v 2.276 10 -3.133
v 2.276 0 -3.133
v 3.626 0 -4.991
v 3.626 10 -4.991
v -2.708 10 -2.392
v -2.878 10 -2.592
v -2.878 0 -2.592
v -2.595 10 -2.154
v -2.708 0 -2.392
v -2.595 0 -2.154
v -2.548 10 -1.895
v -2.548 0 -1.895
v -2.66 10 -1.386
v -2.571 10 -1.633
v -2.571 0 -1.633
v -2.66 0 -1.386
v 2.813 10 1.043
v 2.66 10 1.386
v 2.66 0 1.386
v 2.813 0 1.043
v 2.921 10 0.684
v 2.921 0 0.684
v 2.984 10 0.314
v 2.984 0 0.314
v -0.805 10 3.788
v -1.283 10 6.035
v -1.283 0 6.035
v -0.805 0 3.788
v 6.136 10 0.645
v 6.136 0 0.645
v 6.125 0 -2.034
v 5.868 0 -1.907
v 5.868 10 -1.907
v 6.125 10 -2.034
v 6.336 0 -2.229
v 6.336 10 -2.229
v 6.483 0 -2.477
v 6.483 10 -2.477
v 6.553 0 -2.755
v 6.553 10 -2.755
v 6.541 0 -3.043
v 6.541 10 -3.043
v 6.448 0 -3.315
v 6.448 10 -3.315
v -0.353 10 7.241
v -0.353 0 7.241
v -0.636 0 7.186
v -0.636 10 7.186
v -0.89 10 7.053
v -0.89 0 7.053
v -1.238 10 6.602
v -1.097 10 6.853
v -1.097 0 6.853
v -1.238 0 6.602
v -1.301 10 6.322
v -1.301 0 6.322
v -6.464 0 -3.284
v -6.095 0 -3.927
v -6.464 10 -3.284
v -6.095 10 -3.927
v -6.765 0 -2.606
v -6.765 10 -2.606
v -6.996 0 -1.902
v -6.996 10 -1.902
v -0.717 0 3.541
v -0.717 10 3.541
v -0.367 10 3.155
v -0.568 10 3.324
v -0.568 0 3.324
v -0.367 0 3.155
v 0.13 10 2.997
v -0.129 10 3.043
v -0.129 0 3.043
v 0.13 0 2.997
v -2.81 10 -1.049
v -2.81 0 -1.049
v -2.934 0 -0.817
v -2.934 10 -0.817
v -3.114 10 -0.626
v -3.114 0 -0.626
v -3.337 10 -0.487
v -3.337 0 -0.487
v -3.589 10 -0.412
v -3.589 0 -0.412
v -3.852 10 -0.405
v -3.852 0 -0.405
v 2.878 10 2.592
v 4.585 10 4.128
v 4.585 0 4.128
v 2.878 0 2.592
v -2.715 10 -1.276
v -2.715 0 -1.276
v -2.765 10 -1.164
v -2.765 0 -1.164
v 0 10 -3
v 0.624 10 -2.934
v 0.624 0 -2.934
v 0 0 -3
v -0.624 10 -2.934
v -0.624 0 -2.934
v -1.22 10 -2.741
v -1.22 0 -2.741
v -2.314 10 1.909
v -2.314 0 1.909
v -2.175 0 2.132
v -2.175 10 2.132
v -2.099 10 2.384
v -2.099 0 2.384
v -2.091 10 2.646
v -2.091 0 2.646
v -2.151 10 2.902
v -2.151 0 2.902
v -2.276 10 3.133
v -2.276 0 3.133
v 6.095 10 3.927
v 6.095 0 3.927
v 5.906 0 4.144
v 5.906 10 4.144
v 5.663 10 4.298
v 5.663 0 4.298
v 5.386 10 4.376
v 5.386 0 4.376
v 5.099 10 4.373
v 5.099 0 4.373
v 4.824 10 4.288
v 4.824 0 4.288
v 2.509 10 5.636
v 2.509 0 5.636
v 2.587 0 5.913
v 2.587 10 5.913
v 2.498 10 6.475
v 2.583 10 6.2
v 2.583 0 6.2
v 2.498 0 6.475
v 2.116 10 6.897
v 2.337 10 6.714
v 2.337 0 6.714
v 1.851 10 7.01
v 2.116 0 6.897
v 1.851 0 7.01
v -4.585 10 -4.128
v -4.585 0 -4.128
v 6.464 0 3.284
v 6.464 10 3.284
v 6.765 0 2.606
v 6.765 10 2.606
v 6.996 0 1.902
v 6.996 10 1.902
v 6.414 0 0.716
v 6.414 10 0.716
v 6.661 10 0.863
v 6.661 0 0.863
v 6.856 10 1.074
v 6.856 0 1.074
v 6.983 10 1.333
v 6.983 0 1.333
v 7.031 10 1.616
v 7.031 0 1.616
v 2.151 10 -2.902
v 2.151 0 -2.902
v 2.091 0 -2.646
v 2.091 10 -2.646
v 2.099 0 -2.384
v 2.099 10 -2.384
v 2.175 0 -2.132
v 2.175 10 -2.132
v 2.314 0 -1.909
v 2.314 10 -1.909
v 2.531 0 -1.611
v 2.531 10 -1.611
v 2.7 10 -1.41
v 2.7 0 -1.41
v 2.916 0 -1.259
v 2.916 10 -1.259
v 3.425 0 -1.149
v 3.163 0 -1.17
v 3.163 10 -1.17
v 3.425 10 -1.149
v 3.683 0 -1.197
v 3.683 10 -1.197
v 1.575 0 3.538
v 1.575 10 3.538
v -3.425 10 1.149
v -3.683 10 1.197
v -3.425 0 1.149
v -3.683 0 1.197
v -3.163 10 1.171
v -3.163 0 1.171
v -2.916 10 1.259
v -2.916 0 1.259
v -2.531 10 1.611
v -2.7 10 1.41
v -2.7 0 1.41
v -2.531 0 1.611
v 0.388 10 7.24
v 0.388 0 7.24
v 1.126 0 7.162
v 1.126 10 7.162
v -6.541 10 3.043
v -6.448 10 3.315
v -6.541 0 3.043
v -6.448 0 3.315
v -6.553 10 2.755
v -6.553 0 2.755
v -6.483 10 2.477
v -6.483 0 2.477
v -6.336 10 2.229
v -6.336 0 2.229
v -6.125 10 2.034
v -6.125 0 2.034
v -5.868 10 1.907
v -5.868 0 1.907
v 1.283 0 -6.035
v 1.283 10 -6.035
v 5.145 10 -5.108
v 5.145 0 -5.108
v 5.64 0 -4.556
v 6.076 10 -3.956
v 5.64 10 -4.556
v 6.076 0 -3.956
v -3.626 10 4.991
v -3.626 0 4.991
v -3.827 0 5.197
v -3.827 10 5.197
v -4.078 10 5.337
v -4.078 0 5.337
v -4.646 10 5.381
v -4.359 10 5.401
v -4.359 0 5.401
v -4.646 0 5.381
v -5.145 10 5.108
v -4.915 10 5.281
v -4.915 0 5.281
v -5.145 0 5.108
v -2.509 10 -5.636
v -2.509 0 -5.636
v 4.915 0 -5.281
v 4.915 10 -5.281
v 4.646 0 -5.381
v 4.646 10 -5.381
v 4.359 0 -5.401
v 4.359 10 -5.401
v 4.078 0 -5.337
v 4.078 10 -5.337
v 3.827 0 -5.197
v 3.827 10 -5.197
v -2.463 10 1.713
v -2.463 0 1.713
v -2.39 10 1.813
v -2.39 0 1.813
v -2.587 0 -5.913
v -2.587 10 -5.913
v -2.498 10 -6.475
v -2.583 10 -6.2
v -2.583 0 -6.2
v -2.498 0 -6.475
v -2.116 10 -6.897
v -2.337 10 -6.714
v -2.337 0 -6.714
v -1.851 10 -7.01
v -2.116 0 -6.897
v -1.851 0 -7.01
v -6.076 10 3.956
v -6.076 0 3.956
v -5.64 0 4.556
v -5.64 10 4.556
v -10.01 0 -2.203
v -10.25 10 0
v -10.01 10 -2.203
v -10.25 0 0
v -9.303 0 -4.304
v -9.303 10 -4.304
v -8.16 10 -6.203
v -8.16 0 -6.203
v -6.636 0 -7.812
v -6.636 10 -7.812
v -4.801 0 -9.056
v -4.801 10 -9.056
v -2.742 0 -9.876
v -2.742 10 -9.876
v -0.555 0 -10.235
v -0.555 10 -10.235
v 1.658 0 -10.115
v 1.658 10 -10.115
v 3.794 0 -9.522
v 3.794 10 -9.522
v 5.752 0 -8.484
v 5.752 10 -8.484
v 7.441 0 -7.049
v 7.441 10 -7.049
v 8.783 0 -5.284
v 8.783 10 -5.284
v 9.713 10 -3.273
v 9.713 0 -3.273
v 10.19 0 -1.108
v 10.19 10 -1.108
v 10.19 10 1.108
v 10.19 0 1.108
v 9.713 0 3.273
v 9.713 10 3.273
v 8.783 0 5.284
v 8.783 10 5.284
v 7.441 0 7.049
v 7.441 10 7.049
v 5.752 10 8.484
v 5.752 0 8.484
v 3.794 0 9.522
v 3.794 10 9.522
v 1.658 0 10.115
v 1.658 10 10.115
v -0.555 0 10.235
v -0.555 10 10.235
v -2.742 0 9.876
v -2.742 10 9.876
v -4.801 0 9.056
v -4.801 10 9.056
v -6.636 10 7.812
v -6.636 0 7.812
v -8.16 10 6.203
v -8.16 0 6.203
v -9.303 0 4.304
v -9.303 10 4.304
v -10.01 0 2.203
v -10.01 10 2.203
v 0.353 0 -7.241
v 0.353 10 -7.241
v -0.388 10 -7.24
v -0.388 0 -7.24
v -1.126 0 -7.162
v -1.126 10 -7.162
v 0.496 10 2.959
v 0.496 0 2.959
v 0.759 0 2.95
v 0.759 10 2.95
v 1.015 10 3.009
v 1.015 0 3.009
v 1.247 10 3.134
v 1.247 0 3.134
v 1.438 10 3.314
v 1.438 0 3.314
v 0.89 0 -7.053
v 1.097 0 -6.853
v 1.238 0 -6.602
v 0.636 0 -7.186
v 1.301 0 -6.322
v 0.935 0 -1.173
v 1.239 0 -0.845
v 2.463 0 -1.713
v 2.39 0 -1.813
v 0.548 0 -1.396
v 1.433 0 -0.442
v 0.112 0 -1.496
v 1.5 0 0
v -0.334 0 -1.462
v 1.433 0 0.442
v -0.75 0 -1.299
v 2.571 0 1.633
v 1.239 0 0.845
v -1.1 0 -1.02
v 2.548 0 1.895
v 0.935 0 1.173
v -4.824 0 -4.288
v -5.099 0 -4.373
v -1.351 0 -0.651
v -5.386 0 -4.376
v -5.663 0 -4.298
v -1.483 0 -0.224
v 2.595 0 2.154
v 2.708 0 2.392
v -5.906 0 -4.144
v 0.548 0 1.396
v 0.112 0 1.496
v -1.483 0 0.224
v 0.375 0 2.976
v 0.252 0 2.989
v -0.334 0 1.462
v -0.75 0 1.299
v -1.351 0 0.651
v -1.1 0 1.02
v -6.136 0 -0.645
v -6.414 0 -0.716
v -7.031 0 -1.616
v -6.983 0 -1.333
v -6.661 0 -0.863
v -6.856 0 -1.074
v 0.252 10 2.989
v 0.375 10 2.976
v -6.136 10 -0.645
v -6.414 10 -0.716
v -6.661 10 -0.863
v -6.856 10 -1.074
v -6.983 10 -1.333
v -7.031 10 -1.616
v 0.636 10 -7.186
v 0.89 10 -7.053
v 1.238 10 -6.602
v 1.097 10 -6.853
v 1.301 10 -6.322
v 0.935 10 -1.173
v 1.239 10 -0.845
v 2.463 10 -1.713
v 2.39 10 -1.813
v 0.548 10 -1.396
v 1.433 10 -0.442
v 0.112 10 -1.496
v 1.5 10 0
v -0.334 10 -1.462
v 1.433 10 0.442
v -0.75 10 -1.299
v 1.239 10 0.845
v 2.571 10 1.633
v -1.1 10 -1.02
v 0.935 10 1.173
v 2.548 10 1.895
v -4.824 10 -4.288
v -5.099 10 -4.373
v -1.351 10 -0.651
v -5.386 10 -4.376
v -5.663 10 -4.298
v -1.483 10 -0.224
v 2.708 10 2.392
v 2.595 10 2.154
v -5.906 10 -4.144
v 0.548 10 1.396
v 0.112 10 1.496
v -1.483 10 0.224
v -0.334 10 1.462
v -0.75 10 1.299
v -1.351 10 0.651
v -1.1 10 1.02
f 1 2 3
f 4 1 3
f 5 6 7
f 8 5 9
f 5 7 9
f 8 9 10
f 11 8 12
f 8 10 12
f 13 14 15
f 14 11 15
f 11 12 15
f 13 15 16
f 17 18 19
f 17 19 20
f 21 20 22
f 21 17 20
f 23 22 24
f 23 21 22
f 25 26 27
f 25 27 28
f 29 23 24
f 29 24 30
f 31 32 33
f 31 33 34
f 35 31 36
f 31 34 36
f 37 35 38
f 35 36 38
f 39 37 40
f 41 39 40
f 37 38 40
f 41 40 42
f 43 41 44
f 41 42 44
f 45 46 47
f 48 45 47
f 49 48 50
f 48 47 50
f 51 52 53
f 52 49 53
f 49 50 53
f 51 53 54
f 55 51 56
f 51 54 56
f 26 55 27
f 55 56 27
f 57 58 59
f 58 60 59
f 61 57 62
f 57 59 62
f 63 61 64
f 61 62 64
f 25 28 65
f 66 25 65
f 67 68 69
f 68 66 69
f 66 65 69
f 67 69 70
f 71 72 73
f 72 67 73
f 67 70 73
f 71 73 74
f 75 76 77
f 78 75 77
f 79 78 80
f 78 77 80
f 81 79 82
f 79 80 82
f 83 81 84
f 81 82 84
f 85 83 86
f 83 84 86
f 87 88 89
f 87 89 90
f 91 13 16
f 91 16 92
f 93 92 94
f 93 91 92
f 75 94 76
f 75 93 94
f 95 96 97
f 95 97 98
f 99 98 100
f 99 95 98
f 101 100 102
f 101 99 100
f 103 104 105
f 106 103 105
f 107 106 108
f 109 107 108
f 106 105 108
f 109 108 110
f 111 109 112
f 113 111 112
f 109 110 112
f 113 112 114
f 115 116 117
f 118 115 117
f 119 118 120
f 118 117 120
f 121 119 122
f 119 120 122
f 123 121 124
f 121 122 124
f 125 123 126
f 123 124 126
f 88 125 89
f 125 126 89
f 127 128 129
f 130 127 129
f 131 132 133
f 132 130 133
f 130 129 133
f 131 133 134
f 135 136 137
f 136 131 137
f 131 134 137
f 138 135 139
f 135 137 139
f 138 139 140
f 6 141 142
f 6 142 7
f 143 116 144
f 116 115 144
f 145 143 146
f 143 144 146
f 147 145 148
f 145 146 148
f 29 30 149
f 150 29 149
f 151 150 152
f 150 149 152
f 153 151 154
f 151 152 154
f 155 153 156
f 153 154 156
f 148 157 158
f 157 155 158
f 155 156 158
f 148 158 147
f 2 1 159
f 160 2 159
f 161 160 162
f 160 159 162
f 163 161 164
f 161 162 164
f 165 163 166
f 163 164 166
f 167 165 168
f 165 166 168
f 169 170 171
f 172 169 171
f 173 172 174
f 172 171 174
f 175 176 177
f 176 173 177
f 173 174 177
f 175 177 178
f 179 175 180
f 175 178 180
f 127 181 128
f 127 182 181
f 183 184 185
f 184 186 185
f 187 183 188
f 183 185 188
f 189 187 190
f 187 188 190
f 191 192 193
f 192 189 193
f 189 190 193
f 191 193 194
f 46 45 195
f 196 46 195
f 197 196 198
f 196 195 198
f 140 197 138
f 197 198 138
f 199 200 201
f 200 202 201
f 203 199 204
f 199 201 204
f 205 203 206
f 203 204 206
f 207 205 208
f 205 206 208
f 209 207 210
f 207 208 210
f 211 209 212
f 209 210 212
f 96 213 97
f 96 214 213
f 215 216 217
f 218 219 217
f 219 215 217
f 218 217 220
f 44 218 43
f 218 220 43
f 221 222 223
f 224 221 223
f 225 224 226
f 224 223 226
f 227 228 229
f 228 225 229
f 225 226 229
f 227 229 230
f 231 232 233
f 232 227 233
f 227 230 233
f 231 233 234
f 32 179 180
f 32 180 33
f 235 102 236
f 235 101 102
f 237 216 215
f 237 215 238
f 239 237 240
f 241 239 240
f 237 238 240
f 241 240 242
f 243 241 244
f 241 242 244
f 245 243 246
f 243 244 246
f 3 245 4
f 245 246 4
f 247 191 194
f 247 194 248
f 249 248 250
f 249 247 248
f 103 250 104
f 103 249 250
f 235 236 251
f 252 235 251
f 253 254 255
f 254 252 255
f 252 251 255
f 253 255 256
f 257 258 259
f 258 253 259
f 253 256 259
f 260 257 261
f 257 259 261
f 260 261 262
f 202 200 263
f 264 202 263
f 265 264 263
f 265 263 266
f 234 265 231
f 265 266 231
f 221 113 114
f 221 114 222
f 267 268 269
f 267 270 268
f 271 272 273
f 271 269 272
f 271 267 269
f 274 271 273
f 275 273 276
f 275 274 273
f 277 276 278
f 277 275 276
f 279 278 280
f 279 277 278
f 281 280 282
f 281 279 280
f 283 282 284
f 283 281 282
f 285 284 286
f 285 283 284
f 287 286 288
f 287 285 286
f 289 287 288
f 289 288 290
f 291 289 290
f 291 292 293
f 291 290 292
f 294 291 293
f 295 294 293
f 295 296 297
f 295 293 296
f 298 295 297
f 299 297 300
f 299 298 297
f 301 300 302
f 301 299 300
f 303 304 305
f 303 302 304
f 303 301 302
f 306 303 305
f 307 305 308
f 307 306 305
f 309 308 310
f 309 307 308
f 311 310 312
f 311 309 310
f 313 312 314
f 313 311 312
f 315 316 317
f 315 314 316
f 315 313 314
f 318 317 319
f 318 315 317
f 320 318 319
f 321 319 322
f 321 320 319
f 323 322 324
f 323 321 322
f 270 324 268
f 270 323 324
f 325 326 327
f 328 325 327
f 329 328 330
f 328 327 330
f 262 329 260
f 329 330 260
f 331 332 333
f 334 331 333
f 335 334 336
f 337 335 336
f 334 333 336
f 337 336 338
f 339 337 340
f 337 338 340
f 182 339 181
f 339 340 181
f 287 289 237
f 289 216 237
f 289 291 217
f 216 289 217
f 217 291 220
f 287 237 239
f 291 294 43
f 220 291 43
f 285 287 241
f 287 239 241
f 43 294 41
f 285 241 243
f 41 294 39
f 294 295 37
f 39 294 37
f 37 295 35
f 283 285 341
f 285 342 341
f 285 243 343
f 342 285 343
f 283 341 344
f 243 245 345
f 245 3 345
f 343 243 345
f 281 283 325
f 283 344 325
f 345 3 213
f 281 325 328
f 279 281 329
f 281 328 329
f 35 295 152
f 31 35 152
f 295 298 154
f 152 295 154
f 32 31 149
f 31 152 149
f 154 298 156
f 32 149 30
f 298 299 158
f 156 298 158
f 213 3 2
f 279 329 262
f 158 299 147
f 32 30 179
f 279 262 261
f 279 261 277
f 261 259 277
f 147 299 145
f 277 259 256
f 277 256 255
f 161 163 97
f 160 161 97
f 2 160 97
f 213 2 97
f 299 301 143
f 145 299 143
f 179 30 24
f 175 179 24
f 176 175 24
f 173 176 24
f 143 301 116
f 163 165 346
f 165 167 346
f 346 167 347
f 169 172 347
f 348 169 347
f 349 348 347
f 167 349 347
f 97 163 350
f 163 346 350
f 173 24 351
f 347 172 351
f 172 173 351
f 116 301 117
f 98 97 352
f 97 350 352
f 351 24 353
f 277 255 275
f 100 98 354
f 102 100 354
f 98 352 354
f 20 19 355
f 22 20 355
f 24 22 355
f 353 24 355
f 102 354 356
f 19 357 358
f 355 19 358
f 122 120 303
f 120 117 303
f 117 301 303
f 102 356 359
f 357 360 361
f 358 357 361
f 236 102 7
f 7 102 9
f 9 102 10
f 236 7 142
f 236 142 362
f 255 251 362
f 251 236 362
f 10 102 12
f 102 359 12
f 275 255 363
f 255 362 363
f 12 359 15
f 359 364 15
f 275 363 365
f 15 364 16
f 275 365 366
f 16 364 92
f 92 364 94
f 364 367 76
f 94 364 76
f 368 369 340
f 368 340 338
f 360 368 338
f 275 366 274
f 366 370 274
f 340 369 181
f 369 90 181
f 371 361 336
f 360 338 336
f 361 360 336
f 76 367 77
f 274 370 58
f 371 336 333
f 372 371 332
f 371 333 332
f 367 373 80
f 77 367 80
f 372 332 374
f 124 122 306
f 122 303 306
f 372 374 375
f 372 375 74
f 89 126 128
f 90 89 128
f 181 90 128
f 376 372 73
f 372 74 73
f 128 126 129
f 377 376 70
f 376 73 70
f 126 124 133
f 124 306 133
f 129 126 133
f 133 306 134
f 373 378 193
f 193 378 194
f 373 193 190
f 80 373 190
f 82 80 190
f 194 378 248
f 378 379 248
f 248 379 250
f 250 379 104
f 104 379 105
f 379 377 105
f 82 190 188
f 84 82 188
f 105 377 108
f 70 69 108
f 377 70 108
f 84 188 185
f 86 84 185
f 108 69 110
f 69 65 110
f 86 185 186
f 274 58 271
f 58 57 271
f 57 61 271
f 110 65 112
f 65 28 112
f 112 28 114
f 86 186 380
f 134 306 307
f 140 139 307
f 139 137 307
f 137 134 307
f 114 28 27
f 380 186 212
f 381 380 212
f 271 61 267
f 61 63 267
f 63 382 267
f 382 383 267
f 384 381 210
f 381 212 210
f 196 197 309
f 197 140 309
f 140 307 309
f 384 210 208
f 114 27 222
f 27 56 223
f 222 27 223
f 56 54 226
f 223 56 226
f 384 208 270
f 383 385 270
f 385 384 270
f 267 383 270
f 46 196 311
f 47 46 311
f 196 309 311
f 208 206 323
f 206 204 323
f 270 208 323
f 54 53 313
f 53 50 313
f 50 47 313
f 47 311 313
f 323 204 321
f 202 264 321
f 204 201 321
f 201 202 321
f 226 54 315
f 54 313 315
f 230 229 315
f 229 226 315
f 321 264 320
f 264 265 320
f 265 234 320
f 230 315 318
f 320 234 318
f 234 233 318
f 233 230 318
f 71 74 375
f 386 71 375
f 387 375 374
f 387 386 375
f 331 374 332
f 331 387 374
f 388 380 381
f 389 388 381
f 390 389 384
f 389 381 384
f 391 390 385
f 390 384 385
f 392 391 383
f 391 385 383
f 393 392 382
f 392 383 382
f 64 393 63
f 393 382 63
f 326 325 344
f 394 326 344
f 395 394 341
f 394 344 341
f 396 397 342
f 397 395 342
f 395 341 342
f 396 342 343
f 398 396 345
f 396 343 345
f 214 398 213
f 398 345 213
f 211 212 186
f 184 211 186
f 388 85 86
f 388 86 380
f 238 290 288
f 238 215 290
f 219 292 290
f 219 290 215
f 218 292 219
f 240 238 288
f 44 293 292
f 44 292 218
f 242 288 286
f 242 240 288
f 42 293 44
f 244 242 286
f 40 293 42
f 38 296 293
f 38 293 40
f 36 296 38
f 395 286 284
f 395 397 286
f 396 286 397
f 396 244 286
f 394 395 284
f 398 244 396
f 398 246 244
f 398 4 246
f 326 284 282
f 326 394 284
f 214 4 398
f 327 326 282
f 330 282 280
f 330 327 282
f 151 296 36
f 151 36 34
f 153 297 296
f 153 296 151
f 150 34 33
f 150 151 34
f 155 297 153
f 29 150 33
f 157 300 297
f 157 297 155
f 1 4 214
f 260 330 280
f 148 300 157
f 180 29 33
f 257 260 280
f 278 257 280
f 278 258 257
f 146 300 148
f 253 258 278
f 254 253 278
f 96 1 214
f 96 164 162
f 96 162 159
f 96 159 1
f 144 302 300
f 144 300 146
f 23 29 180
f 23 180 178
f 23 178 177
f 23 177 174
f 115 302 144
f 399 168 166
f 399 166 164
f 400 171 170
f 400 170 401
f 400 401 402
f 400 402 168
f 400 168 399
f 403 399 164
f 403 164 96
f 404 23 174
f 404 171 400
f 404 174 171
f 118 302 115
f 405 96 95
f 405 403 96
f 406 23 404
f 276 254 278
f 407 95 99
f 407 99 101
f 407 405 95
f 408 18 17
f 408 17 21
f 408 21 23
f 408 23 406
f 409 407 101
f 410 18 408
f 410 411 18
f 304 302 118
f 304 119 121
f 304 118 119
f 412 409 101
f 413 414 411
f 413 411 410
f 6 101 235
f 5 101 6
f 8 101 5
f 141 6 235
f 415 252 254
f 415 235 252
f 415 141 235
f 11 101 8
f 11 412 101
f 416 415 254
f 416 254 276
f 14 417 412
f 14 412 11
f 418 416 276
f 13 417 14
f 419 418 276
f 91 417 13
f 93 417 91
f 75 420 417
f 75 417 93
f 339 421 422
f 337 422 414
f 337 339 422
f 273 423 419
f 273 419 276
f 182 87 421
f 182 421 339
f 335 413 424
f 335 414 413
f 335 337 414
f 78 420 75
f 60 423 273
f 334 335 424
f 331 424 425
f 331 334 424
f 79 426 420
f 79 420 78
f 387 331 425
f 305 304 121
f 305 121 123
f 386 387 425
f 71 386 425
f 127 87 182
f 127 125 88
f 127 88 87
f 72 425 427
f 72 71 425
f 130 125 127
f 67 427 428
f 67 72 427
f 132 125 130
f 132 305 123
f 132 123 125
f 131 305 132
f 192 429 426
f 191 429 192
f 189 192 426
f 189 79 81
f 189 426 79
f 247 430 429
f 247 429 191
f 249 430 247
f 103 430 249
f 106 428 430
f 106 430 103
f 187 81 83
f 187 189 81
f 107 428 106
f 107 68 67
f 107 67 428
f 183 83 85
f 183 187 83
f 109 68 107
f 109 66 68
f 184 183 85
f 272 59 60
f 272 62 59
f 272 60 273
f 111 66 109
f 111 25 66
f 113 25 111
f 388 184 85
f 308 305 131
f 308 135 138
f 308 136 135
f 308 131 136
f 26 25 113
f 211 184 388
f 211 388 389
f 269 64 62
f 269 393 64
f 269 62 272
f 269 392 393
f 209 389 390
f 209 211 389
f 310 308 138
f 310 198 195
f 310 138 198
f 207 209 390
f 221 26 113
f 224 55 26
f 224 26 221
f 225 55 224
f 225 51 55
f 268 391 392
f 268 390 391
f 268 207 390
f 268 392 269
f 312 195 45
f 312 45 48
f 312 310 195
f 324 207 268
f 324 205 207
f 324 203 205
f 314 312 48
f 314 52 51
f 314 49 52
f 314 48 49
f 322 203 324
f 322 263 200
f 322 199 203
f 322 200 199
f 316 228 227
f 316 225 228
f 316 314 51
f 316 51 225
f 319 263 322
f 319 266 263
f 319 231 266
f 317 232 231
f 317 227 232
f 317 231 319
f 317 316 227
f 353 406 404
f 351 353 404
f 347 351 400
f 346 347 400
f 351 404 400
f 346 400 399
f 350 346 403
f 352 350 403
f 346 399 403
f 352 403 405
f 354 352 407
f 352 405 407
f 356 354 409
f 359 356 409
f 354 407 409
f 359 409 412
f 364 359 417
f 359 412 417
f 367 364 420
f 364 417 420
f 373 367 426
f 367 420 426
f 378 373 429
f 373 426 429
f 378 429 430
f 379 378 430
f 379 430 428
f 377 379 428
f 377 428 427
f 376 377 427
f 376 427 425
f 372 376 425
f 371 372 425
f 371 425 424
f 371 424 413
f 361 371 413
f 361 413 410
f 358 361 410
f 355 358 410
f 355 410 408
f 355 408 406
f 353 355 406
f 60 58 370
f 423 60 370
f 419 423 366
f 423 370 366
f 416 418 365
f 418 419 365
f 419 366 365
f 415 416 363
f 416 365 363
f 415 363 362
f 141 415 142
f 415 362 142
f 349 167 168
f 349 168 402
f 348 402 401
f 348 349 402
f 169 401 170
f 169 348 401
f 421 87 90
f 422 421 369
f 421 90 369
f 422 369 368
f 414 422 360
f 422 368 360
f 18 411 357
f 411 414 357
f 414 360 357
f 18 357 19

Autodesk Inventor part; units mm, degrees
ref_plane "YZ Plane" through (0, 0, 0) normal (1, 0, 0) x (0, 1, 0)
ref_plane "XZ Plane" through (0, 0, 0) normal (0, 1, 0) x (-1, 0, 0)
ref_plane "XY Plane" through (0, 0, 0) normal (0, 0, 1) x (1, 0, 0)
sketch "Sketch1" plane through (0, 0, 0) normal (0, 1, 0) x (-1, 0, 0)
  circle A0 centre (0, 0) radius 10.25
  circle A1 centre (0, 0) radius 3
  line L0 (0, 0) -> (0, 7.25)
  line L1 (0, 0) -> (-4.2614, 5.8654)
  line L2 (0, 0) -> (-6.8952, 2.2404)
  line L3 (0, 0) -> (-6.8952, -2.2404)
  line L4 (0, 0) -> (-4.2614, -5.8654)
  line L5 (0, 0) -> (0, -7.25)
  line L6 (0, 0) -> (4.2614, -5.8654)
  line L7 (0, 0) -> (6.8952, -2.2404)
  line L8 (0, 0) -> (6.8952, 2.2404)
  line L9 (0, 0) -> (4.2614, 5.8654)
  arc A2 (4.2614, 5.8654) -> (0, 7.25) centre (0, 0) ccw
  arc A3 (-4.2614, 5.8654) -> (-6.8952, 2.2404) centre (0, 0) ccw
  arc A4 (-6.8952, -2.2404) -> (-4.2614, -5.8654) centre (0, 0) ccw
  arc A5 (0, -7.25) -> (4.2614, -5.8654) centre (0, 0) ccw
  arc A6 (6.8952, -2.2404) -> (6.8952, 2.2404) centre (0, 0) ccw
  arc A7 (4.2614, 5.8654) -> (0, 7.25) centre (0, 0) ccw
  arc A8 (6.8952, -2.2404) -> (6.8952, 2.2404) centre (0, 0) ccw
  arc A9 (0, -7.25) -> (4.2614, -5.8654) centre (0, 0) ccw
  arc A10 (-6.8952, -2.2404) -> (-4.2614, -5.8654) centre (0, 0) ccw
  arc A11 (-4.2614, 5.8654) -> (-6.8952, 2.2404) centre (0, 0) ccw
  circle A12 centre (0, 0) radius 3
  dimension "d0" = 20.5
  dimension "d2" = 6
  dimension "d5" = 360
extrude "Extrusion1" add sketch "Sketch1" along normal blind 10 contours A0 | A1 L7 L8 | A1 L8 A6 L7 | L8 L9 A1 | A1 L6 L7 | L9 L0 A1 | A1 L0 A2 L9 | L1 A1 L0 | L2 A1 L1 | L3 A1 L2 | L4 A1 L3 | L5 A1 L4 | L6 A1 L5 | L6 A5 L5 A1 | A1 L2 A3 L1
sketch "Sketch2" plane through (0, 10, 0) normal (0, 1, 0) x (1, 0, 0)
  point P0 (0, 0)
sketch "Sketch3" plane through (0, 10, 0) normal (0, 1, 0) x (1, 0, 0)
  arc A0 (2.8532, 0.9271) -> (1.7634, 2.4271) centre (0, 0) ccw
  line L0 (1.7634, 2.4271) -> (4.2614, 5.8654)
  arc A1 (6.8952, 2.2404) -> (4.2614, 5.8654) centre (0, 0) ccw
  line L1 (6.8952, 2.2404) -> (2.8532, 0.9271)
  line L2 (-1.2202, 2.7406) -> (-2.9488, 6.6232)
  arc A2 (0.6237, 2.9344) -> (-1.2202, 2.7406) centre (0, 0) ccw
  line L3 (1.5074, 7.0916) -> (0.6237, 2.9344)
  arc A3 (1.5074, 7.0916) -> (-2.9488, 6.6232) centre (0, 0) ccw
  line L4 (-2.9836, 0.3136) -> (-7.2103, 0.7578)
  arc A4 (-2.2294, 2.0074) -> (-2.9836, 0.3136) centre (0, 0) ccw
  line L5 (-5.3878, 4.8512) -> (-2.2294, 2.0074)
  arc A5 (-5.3878, 4.8512) -> (-7.2103, 0.7578) centre (0, 0) ccw
  line L6 (-1.7634, -2.4271) -> (-4.2614, -5.8654)
  arc A6 (-2.8532, -0.9271) -> (-1.7634, -2.4271) centre (0, 0) ccw
  line L7 (-6.8952, -2.2404) -> (-2.8532, -0.9271)
  arc A7 (-6.8952, -2.2404) -> (-4.2614, -5.8654) centre (0, 0) ccw
  line L8 (1.2202, -2.7406) -> (2.9488, -6.6232)
  arc A8 (-0.6237, -2.9344) -> (1.2202, -2.7406) centre (0, 0) ccw
  line L9 (-1.5074, -7.0916) -> (-0.6237, -2.9344)
  arc A9 (-1.5074, -7.0916) -> (2.9488, -6.6232) centre (0, 0) ccw
  line L10 (2.9836, -0.3136) -> (7.2103, -0.7578)
  arc A10 (2.2294, -2.0074) -> (2.9836, -0.3136) centre (0, 0) ccw
  line L11 (5.3878, -4.8512) -> (2.2294, -2.0074)
  arc A11 (5.3878, -4.8512) -> (7.2103, -0.7578) centre (0, 0) ccw
  dimension "d11" = 360
extrude "Extrusion2" cut sketch "Sketch3" against normal blind 10 contours L2 A3 L3 A2 | L4 A5 L5 A4 | L6 A7 L7 A6 | L8 A9 L9 A8 | L10 A11 L11 A10
fillet "Fillet1" radius 1 21 edges at (-6.8952, 5, 2.2404) (-7.2103, 5, -0.7578) (-2.9488, 5, -6.6232) (1.7634, 5, -2.4271) (2.2294, 5, 2.0074) (-1.5074, 5, 7.0916) (2.8532, 5, -0.9271) (2.9488, 5, 6.6232) (-2.9836, 5, -0.3136) (6.8952, 5, -2.2404) (5.3878, 5, 4.8512) (7.2103, 5, 0.7578) (1.5074, 5, -7.0916) (-5.3878, 5, -4.8512) (4.2614, 5, -5.8654) (-0.6237, 5, 2.9344) (1.2202, 5, 2.7406) (-2.8532, 5, 0.9271) (-4.2614, 5, 5.8654) (-1.7634, 5, 2.4271) (-2.2294, 5, -2.0074)
sketch "Sketch4" plane through (0, 10, 0) normal (0, 1, 0) x (1, 0, 0)
  circle A0 centre (0, 0) radius 1.5
  dimension "d16" = 3
extrude "Extrusion3" cut sketch "Sketch4" against normal blind 10
properties part number "rin"
